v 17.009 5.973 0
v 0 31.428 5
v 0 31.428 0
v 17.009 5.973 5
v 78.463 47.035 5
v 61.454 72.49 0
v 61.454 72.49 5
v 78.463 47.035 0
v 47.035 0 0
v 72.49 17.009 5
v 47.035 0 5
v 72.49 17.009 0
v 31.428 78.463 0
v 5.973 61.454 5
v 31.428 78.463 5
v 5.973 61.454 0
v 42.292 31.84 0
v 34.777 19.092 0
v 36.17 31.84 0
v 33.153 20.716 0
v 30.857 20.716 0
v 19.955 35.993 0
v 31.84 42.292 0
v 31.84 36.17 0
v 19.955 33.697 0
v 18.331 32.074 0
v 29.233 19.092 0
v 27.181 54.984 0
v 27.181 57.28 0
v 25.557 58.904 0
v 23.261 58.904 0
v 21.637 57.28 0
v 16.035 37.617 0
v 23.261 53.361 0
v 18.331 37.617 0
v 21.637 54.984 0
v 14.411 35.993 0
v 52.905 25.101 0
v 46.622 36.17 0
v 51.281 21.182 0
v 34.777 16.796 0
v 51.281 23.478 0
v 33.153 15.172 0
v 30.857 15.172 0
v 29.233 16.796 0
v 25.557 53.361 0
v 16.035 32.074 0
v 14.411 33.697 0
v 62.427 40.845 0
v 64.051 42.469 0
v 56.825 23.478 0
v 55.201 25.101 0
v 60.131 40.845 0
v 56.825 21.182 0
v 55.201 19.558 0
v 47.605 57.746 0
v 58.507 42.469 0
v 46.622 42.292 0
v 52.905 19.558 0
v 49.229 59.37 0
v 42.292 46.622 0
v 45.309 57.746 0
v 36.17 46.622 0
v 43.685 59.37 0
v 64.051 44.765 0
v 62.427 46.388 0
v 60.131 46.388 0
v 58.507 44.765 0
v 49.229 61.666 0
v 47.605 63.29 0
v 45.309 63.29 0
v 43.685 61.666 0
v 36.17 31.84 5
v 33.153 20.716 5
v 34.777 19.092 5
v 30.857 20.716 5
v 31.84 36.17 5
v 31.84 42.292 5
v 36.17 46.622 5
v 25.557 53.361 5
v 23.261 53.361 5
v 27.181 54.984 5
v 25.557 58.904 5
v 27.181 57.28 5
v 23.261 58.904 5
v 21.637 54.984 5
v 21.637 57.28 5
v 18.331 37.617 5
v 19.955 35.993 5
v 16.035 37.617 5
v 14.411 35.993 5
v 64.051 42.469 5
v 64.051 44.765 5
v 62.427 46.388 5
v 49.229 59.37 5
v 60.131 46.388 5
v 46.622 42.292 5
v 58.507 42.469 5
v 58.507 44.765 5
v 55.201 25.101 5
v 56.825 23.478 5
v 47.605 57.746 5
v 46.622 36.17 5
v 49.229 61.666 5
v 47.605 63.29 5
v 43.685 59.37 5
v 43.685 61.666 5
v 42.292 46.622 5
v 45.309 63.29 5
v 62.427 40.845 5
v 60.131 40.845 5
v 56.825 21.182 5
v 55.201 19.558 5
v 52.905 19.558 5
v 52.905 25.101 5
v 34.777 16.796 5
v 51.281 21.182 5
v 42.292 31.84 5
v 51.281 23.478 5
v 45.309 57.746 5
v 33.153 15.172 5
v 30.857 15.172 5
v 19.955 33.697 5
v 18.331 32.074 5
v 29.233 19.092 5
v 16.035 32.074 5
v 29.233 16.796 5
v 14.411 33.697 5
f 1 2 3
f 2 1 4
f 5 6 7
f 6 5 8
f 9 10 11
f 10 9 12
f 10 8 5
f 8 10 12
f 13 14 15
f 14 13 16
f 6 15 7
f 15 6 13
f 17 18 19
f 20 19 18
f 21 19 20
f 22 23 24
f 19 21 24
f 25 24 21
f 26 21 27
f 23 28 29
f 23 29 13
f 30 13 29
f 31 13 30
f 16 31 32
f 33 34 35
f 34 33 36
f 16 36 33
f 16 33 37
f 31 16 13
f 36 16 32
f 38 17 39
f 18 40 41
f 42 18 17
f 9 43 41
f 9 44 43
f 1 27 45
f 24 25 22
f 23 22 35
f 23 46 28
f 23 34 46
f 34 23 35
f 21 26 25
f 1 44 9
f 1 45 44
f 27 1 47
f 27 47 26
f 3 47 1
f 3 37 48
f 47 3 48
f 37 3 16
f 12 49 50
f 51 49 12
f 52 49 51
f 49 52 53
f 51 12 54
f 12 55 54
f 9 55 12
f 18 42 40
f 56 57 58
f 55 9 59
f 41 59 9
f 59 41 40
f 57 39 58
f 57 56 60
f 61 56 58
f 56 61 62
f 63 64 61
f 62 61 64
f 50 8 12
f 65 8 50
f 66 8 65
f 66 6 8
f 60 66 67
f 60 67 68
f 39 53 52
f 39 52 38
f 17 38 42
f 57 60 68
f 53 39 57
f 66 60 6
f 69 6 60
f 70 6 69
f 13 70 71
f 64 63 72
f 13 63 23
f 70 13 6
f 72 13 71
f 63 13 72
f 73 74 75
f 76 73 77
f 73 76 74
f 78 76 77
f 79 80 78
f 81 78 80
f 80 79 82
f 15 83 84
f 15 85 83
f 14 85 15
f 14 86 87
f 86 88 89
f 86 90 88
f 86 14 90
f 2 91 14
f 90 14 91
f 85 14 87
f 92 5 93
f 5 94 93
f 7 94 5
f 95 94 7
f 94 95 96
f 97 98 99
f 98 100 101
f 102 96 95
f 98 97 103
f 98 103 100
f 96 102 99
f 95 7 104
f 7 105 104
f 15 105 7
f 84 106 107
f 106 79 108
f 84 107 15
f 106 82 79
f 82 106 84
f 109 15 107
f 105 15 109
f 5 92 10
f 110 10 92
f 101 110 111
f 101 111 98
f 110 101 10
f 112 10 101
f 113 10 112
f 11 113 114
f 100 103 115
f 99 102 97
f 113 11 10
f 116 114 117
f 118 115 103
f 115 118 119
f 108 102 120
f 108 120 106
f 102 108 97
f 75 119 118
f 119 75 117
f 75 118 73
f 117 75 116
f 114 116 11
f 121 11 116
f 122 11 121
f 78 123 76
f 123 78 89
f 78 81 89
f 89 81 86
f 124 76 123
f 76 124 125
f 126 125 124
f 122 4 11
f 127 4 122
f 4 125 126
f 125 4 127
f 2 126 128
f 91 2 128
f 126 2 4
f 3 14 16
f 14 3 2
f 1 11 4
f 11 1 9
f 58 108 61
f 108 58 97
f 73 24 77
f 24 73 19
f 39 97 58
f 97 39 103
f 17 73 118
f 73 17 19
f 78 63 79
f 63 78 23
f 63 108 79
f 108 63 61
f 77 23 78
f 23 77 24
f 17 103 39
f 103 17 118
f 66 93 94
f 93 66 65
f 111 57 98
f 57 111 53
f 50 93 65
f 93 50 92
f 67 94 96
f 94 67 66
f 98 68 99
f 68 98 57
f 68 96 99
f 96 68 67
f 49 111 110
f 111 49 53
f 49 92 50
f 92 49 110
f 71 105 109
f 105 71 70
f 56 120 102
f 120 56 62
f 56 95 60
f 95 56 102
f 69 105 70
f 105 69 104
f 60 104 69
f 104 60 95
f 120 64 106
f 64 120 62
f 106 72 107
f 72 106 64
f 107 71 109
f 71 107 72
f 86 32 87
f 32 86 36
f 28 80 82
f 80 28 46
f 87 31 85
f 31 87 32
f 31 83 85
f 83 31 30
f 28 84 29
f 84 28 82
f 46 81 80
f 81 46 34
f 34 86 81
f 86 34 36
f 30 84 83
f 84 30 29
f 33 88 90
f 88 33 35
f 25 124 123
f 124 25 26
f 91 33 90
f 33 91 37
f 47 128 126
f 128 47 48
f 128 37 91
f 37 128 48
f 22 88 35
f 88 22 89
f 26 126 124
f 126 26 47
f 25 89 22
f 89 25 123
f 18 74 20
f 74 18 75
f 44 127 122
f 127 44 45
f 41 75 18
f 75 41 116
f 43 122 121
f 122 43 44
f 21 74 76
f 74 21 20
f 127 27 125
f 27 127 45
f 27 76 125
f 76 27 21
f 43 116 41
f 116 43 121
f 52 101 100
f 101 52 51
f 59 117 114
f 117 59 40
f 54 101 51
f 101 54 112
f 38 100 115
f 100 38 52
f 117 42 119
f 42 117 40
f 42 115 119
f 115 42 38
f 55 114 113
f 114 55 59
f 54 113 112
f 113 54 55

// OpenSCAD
$fn = 32;

// ----------------------------------------------------------------------
// Polygon plate: 8-gon R40, 6 bolt windows
// ----------------------------------------------------------------------

// --- parameters (mm) ---
sides = 8;                // number of polygon sides
plate_r = 40;             // circumscribed radius of the polygon
bore_r = 8;               // centre bore radius
bolts = 6;                // number of bolt windows
ring_r = 22.48;           // bolt-circle radius
bolt_r = 3;               // bolt window radius
plate_t = 5;              // plate thickness, Z (extrusion height)
fit_tol = 0.05;           // declared fit tolerance (prompt contract)
free_tol = 0.3;           // declared free tolerance (prompt contract)

plate_d = 2 * plate_r;  // circumscribed diameter
bore_d = 2 * bore_r;  // centre bore diameter
bolt_d = 2 * bolt_r;  // bolt window diameter
ring_d = 2 * ring_r;  // bolt-circle diameter

profile = [[78.463, 47.035], [61.454, 72.49], [31.428, 78.463], [5.973, 61.454], [0, 31.428], [17.009, 5.973], [47.035, 0], [72.49, 17.009]];  // primary outline, 8 points, counter clockwise
void_1 = [[46.622, 42.292], [42.292, 46.622], [36.17, 46.622], [31.84, 42.292], [31.84, 36.17], [36.17, 31.84], [42.292, 31.84], [46.622, 36.17]];  // centre bore, 8 points
void_2 = [[64.051, 44.765], [62.427, 46.388], [60.131, 46.388], [58.507, 44.765], [58.507, 42.469], [60.131, 40.845], [62.427, 40.845], [64.051, 42.469]];  // bolt window 1, 8 points
void_3 = [[49.229, 61.666], [47.605, 63.29], [45.309, 63.29], [43.685, 61.666], [43.685, 59.37], [45.309, 57.746], [47.605, 57.746], [49.229, 59.37]];  // bolt window 2, 8 points
void_4 = [[27.181, 57.28], [25.557, 58.904], [23.261, 58.904], [21.637, 57.28], [21.637, 54.984], [23.261, 53.361], [25.557, 53.361], [27.181, 54.984]];  // bolt window 3, 8 points
void_5 = [[19.955, 35.993], [18.331, 37.617], [16.035, 37.617], [14.411, 35.993], [14.411, 33.697], [16.035, 32.074], [18.331, 32.074], [19.955, 33.697]];  // bolt window 4, 8 points
void_6 = [[34.777, 19.092], [33.153, 20.716], [30.857, 20.716], [29.233, 19.092], [29.233, 16.796], [30.857, 15.172], [33.153, 15.172], [34.777, 16.796]];  // bolt window 5, 8 points
void_7 = [[56.825, 23.478], [55.201, 25.101], [52.905, 25.101], [51.281, 23.478], [51.281, 21.182], [52.905, 19.558], [55.201, 19.558], [56.825, 21.182]];  // bolt window 6, 8 points

// --- the one profile operation ---
difference() {
  linear_extrude(height = plate_t) polygon(points = profile);
  translate([0, 0, -1])
    linear_extrude(height = plate_t + 2) polygon(points = void_1);
  translate([0, 0, -1])
    linear_extrude(height = plate_t + 2) polygon(points = void_2);
  translate([0, 0, -1])
    linear_extrude(height = plate_t + 2) polygon(points = void_3);
  translate([0, 0, -1])
    linear_extrude(height = plate_t + 2) polygon(points = void_4);
  translate([0, 0, -1])
    linear_extrude(height = plate_t + 2) polygon(points = void_5);
  translate([0, 0, -1])
    linear_extrude(height = plate_t + 2) polygon(points = void_6);
  translate([0, 0, -1])
    linear_extrude(height = plate_t + 2) polygon(points = void_7);
}
